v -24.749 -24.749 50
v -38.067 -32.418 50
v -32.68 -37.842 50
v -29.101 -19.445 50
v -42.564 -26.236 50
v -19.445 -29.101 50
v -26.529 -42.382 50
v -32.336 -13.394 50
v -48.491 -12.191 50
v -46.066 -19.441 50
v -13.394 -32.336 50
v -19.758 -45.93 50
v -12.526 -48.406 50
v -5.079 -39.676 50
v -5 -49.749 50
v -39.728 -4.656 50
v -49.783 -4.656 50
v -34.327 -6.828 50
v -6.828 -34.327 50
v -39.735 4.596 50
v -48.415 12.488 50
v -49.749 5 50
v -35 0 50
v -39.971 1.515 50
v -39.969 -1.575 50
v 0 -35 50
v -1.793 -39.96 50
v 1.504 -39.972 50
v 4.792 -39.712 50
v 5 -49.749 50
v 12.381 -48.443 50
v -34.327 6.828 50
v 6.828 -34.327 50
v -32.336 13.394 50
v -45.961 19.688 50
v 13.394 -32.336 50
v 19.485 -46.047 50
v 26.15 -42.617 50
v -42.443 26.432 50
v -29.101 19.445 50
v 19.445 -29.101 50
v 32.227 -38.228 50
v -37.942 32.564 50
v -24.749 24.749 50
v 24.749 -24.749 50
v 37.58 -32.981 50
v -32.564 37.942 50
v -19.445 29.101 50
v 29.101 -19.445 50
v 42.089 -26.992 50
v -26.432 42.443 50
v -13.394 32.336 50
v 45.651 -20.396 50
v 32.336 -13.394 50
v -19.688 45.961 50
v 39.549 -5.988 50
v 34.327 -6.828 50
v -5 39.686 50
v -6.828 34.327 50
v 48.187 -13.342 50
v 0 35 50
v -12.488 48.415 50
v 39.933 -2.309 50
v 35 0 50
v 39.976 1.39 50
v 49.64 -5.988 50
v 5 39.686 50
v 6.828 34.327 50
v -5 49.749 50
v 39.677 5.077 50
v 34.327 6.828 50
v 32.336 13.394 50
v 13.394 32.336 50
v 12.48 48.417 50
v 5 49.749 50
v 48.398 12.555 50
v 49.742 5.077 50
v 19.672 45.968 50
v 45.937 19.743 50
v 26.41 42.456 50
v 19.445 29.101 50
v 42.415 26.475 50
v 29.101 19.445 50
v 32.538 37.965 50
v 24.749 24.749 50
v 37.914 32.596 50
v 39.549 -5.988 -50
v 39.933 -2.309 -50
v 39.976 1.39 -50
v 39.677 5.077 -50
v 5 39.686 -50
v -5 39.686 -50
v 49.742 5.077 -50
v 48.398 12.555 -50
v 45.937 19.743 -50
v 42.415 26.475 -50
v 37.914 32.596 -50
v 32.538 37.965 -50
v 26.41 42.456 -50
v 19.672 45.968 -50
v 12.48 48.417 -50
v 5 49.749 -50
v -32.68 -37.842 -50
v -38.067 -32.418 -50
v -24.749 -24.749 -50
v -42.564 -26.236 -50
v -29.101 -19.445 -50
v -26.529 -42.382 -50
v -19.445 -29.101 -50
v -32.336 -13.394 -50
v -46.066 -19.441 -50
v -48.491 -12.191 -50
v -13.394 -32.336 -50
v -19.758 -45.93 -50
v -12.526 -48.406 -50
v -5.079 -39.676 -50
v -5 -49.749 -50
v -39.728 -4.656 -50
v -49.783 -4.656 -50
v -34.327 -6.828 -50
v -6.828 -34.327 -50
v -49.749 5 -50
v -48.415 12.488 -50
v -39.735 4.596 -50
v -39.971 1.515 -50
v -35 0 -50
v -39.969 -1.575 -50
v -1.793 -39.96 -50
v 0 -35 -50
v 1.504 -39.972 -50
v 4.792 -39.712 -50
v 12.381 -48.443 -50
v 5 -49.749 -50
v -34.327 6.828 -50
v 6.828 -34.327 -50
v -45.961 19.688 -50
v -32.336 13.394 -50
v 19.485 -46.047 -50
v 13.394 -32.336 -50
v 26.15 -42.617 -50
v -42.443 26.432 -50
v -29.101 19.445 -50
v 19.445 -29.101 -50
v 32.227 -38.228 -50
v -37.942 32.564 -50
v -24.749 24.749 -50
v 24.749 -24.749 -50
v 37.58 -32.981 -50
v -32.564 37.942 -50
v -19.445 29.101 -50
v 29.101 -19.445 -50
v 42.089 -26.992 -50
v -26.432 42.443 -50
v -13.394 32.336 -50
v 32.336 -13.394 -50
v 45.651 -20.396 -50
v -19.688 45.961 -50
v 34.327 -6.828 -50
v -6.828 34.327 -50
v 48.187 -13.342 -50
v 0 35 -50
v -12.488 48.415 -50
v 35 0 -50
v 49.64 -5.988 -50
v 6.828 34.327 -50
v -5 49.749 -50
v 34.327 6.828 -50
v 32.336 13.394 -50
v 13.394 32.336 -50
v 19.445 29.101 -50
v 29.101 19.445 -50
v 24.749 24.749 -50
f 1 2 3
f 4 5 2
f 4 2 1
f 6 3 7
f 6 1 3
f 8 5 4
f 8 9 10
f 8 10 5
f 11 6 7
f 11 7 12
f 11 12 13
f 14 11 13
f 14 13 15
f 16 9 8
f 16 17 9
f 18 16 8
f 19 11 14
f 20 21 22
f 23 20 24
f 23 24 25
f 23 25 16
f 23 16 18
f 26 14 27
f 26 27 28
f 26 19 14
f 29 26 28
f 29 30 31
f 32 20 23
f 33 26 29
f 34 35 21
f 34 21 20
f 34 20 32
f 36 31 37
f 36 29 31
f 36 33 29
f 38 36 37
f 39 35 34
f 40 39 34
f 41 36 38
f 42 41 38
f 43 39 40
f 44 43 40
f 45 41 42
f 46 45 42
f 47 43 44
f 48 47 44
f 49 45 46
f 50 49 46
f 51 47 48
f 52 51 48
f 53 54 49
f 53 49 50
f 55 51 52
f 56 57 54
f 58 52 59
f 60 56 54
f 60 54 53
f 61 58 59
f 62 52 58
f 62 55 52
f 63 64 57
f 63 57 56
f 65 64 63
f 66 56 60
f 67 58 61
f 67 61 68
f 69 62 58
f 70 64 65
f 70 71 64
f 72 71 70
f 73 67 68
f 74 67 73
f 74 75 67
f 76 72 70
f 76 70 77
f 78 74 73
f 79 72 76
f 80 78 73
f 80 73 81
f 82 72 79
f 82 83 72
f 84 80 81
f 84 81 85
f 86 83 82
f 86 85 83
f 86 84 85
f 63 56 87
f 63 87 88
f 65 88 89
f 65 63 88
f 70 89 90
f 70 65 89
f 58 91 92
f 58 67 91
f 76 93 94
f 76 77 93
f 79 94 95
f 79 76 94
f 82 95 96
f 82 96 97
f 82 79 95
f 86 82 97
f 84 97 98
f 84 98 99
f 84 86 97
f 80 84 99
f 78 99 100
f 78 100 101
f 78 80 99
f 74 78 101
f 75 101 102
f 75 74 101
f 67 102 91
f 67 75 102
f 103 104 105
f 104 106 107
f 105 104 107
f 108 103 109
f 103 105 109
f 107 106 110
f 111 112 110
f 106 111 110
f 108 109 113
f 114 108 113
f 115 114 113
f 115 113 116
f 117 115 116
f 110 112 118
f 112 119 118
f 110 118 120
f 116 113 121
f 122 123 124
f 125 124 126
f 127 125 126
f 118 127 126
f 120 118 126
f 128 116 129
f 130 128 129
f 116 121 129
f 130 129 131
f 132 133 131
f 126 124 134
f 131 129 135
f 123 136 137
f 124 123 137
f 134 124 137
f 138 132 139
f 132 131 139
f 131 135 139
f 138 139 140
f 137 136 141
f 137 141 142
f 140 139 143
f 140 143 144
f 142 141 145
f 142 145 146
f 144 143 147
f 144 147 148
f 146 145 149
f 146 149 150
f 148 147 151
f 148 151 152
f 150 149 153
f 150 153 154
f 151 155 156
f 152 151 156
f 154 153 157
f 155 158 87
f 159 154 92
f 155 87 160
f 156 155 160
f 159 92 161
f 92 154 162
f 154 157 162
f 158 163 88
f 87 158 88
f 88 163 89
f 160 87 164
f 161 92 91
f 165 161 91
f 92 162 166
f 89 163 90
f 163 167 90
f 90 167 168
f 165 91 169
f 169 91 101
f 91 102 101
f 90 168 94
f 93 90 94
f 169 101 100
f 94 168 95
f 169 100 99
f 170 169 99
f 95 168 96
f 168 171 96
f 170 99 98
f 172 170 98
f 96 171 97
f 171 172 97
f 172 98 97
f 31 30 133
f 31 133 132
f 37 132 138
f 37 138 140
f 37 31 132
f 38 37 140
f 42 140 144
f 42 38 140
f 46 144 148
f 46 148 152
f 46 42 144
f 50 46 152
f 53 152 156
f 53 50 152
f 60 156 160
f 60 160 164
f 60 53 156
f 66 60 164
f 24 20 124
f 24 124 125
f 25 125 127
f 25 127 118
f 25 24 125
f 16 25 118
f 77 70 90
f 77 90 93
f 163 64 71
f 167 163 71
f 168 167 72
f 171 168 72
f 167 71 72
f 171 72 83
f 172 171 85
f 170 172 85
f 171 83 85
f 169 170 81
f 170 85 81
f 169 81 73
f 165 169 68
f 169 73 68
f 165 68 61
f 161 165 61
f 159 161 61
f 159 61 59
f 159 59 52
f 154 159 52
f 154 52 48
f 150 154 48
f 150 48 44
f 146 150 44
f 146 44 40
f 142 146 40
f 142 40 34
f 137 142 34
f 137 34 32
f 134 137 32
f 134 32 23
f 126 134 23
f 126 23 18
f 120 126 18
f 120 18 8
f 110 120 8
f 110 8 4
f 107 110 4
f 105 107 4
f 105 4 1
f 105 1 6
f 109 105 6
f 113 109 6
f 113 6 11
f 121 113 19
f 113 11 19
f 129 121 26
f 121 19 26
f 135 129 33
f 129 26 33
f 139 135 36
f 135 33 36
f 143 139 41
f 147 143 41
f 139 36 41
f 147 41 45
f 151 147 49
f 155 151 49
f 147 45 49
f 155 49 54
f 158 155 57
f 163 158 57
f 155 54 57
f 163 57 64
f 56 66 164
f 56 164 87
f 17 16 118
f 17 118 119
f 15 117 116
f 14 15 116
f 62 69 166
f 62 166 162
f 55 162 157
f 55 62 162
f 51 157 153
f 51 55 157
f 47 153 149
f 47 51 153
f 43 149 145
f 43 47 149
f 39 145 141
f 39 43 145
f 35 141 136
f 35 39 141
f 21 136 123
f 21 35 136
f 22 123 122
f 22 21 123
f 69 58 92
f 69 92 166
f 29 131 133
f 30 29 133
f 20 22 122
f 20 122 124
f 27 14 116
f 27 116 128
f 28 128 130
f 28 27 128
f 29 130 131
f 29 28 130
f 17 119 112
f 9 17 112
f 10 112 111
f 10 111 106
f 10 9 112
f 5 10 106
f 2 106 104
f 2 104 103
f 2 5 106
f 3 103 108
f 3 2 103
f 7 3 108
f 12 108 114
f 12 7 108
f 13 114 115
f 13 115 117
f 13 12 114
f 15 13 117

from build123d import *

# Parameters (mm, degrees)
F1_DEPTH = 50
F2_R     = 35
F3_DEPTH = 200


with BuildPart() as f1:
    # F0 (on Top) → F1 (new body, symmetric)
    with BuildSketch(Plane.XY):
        with BuildLine():
            Line((5, 39.68627), (-5, 39.68627))
            ThreePointArc((-5, 39.68627), (-28.427655, 28.140156), (-39.735042, 4.596351))
            ThreePointArc((-39.735042, 4.596351), (-39.999989, -0.030145), (-39.728069, -4.656237))
            ThreePointArc((-39.728069, -4.656237), (-28.434455, -28.133286), (-5.078989, -39.676238))
            ThreePointArc((-5.078989, -39.676238), (-0.14475, -39.999738), (4.791701, -39.711958))
            ThreePointArc((4.791701, -39.711958), (27.854373, -28.707732), (39.54933, -5.987525))
            ThreePointArc((39.54933, -5.987525), (39.997358, -0.45972), (39.676503, 5.076922))
            ThreePointArc((39.676503, 5.076922), (28.256844, 28.311672), (5, 39.68627))
        make_face()
        with BuildLine():
            ThreePointArc((-39.735042, 4.596351), (-28.427655, 28.140156), (-5, 39.68627))
            Line((-5, 39.68627), (-5, 49.749372))
            ThreePointArc((-5, 49.749372), (-35.355339, 35.355339), (-49.749372, 5))
            Line((-49.749372, 5), (-39.735042, 4.596351))
        make_face()
        with BuildLine():
            Line((5, 49.749372), (5, 39.68627))
            ThreePointArc((5, 39.68627), (28.256844, 28.311672), (39.676503, 5.076922))
            Line((39.676503, 5.076922), (49.741581, 5.076922))
            ThreePointArc((49.741581, 5.076922), (35.327993, 35.382664), (5, 49.749372))
        make_face()
        with BuildLine():
            ThreePointArc((-5.078989, -39.676238), (-28.434455, -28.133286), (-39.728069, -4.656237))
            Line((-39.728069, -4.656237), (-49.782722, -4.656237))
            ThreePointArc((-49.782722, -4.656237), (-35.477237, -35.233019), (-5, -49.749372))
            Line((-5, -49.749372), (-5.078989, -39.676238))
        make_face()
        with BuildLine():
            Line((49.640201, -5.987525), (39.54933, -5.987525))
            ThreePointArc((39.54933, -5.987525), (27.854373, -28.707732), (4.791701, -39.711958))
            Line((4.791701, -39.711958), (5, -49.749372))
            ThreePointArc((5, -49.749372), (35.002324, -35.704864), (49.640201, -5.987525))
        make_face()
    extrude(amount=F1_DEPTH, both=True)

    # F2 (on face) → F3 (cut)
    with BuildSketch(Plane.XY.offset(50)):
        Circle(F2_R)
    extrude(amount=-F3_DEPTH, mode=Mode.SUBTRACT)


solid = f1.part
